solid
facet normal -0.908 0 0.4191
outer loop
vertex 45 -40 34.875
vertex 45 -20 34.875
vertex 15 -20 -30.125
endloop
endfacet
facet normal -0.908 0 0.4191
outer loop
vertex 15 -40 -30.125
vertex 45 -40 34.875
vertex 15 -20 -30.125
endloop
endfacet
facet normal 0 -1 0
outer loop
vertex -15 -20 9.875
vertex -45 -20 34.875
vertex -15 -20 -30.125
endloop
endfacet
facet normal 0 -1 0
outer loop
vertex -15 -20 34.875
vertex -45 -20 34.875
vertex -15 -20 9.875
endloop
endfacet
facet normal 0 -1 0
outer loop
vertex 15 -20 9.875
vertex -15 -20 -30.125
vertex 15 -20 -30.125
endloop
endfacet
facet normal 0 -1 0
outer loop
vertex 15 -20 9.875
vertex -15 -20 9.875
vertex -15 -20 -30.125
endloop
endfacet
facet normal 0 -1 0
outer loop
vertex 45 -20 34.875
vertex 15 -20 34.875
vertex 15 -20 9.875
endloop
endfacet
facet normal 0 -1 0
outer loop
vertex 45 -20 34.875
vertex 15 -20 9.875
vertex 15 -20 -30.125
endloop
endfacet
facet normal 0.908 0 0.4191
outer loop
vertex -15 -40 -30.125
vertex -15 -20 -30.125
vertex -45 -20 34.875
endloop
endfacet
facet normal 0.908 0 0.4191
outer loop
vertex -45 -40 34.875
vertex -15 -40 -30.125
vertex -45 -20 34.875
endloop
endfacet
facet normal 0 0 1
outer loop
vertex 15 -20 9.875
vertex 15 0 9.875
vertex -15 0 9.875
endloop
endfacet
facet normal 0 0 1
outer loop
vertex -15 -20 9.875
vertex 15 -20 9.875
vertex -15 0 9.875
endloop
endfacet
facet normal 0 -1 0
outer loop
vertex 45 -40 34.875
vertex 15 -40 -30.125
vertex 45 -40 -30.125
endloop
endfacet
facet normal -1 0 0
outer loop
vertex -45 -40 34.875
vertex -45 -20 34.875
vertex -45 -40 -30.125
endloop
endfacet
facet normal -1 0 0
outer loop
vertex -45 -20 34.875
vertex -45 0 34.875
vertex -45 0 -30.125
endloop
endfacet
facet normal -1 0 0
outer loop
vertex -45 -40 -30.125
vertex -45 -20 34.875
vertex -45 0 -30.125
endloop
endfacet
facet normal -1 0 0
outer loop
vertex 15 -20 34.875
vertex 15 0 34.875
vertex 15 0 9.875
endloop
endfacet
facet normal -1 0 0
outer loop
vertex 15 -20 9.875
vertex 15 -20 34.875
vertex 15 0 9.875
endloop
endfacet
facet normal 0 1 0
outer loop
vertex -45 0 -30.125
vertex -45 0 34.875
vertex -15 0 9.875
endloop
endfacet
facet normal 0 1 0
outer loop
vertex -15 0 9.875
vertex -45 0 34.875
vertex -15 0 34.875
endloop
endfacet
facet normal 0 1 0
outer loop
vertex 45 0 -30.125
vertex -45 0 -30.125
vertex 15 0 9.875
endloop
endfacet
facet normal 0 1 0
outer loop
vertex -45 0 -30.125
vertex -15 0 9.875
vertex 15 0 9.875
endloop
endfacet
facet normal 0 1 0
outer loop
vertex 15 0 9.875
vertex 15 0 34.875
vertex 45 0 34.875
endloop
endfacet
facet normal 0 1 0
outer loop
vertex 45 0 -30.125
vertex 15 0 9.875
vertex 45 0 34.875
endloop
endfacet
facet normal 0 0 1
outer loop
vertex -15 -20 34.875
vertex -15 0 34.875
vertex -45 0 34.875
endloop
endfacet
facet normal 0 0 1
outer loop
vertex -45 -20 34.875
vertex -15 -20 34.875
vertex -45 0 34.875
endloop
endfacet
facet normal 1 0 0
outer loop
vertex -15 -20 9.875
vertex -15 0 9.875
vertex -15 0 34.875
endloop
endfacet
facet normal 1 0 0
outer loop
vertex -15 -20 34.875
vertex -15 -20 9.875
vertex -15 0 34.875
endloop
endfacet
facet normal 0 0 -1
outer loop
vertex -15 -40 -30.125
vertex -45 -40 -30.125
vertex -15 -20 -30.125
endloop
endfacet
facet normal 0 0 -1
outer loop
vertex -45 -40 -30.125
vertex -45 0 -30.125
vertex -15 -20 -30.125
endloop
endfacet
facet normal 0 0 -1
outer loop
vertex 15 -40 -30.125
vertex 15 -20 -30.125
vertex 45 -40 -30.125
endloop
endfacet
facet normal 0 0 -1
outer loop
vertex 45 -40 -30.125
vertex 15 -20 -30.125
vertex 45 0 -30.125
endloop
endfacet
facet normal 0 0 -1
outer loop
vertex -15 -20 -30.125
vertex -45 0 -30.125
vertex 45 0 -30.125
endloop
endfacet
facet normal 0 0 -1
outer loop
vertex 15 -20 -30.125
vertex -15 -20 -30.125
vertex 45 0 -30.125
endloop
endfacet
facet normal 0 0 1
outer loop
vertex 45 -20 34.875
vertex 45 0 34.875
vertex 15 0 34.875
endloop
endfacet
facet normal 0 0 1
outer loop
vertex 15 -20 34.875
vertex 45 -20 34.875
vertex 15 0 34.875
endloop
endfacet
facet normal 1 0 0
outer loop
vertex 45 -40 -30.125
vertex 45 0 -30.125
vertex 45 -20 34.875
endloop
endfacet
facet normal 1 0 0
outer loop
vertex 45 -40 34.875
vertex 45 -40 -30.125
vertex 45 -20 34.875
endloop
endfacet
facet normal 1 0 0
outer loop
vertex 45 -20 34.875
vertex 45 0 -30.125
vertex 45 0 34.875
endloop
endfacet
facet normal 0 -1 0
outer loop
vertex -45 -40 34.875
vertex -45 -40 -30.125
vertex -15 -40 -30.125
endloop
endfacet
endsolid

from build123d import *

# Parameters (mm, degrees)
F1_DEPTH = 20
F3_DEPTH = 20


with BuildPart() as f1:
    # F0 (on Front) → F1 (new body)
    with BuildSketch(Plane.XZ):
        Polygon((-45, 34.875002), (-45, -30.124998), (0, -30.124998), (45, -30.124998), (45, 34.875002), (15, 34.875002), (15, 9.875002), (-15, 9.875002), (-15, 34.875002), align=None)
    extrude(amount=F1_DEPTH)

    # F2 (on face) → F3 (join)
    with BuildSketch(Plane.XZ.offset(20)):
        Polygon((-45, 34.875002), (-45, -30.124998), (-15, -30.124998), align=None)
        Polygon((45, 34.875002), (15, -30.124998), (45, -30.124998), align=None)
    extrude(amount=F3_DEPTH)


solid = f1.part
